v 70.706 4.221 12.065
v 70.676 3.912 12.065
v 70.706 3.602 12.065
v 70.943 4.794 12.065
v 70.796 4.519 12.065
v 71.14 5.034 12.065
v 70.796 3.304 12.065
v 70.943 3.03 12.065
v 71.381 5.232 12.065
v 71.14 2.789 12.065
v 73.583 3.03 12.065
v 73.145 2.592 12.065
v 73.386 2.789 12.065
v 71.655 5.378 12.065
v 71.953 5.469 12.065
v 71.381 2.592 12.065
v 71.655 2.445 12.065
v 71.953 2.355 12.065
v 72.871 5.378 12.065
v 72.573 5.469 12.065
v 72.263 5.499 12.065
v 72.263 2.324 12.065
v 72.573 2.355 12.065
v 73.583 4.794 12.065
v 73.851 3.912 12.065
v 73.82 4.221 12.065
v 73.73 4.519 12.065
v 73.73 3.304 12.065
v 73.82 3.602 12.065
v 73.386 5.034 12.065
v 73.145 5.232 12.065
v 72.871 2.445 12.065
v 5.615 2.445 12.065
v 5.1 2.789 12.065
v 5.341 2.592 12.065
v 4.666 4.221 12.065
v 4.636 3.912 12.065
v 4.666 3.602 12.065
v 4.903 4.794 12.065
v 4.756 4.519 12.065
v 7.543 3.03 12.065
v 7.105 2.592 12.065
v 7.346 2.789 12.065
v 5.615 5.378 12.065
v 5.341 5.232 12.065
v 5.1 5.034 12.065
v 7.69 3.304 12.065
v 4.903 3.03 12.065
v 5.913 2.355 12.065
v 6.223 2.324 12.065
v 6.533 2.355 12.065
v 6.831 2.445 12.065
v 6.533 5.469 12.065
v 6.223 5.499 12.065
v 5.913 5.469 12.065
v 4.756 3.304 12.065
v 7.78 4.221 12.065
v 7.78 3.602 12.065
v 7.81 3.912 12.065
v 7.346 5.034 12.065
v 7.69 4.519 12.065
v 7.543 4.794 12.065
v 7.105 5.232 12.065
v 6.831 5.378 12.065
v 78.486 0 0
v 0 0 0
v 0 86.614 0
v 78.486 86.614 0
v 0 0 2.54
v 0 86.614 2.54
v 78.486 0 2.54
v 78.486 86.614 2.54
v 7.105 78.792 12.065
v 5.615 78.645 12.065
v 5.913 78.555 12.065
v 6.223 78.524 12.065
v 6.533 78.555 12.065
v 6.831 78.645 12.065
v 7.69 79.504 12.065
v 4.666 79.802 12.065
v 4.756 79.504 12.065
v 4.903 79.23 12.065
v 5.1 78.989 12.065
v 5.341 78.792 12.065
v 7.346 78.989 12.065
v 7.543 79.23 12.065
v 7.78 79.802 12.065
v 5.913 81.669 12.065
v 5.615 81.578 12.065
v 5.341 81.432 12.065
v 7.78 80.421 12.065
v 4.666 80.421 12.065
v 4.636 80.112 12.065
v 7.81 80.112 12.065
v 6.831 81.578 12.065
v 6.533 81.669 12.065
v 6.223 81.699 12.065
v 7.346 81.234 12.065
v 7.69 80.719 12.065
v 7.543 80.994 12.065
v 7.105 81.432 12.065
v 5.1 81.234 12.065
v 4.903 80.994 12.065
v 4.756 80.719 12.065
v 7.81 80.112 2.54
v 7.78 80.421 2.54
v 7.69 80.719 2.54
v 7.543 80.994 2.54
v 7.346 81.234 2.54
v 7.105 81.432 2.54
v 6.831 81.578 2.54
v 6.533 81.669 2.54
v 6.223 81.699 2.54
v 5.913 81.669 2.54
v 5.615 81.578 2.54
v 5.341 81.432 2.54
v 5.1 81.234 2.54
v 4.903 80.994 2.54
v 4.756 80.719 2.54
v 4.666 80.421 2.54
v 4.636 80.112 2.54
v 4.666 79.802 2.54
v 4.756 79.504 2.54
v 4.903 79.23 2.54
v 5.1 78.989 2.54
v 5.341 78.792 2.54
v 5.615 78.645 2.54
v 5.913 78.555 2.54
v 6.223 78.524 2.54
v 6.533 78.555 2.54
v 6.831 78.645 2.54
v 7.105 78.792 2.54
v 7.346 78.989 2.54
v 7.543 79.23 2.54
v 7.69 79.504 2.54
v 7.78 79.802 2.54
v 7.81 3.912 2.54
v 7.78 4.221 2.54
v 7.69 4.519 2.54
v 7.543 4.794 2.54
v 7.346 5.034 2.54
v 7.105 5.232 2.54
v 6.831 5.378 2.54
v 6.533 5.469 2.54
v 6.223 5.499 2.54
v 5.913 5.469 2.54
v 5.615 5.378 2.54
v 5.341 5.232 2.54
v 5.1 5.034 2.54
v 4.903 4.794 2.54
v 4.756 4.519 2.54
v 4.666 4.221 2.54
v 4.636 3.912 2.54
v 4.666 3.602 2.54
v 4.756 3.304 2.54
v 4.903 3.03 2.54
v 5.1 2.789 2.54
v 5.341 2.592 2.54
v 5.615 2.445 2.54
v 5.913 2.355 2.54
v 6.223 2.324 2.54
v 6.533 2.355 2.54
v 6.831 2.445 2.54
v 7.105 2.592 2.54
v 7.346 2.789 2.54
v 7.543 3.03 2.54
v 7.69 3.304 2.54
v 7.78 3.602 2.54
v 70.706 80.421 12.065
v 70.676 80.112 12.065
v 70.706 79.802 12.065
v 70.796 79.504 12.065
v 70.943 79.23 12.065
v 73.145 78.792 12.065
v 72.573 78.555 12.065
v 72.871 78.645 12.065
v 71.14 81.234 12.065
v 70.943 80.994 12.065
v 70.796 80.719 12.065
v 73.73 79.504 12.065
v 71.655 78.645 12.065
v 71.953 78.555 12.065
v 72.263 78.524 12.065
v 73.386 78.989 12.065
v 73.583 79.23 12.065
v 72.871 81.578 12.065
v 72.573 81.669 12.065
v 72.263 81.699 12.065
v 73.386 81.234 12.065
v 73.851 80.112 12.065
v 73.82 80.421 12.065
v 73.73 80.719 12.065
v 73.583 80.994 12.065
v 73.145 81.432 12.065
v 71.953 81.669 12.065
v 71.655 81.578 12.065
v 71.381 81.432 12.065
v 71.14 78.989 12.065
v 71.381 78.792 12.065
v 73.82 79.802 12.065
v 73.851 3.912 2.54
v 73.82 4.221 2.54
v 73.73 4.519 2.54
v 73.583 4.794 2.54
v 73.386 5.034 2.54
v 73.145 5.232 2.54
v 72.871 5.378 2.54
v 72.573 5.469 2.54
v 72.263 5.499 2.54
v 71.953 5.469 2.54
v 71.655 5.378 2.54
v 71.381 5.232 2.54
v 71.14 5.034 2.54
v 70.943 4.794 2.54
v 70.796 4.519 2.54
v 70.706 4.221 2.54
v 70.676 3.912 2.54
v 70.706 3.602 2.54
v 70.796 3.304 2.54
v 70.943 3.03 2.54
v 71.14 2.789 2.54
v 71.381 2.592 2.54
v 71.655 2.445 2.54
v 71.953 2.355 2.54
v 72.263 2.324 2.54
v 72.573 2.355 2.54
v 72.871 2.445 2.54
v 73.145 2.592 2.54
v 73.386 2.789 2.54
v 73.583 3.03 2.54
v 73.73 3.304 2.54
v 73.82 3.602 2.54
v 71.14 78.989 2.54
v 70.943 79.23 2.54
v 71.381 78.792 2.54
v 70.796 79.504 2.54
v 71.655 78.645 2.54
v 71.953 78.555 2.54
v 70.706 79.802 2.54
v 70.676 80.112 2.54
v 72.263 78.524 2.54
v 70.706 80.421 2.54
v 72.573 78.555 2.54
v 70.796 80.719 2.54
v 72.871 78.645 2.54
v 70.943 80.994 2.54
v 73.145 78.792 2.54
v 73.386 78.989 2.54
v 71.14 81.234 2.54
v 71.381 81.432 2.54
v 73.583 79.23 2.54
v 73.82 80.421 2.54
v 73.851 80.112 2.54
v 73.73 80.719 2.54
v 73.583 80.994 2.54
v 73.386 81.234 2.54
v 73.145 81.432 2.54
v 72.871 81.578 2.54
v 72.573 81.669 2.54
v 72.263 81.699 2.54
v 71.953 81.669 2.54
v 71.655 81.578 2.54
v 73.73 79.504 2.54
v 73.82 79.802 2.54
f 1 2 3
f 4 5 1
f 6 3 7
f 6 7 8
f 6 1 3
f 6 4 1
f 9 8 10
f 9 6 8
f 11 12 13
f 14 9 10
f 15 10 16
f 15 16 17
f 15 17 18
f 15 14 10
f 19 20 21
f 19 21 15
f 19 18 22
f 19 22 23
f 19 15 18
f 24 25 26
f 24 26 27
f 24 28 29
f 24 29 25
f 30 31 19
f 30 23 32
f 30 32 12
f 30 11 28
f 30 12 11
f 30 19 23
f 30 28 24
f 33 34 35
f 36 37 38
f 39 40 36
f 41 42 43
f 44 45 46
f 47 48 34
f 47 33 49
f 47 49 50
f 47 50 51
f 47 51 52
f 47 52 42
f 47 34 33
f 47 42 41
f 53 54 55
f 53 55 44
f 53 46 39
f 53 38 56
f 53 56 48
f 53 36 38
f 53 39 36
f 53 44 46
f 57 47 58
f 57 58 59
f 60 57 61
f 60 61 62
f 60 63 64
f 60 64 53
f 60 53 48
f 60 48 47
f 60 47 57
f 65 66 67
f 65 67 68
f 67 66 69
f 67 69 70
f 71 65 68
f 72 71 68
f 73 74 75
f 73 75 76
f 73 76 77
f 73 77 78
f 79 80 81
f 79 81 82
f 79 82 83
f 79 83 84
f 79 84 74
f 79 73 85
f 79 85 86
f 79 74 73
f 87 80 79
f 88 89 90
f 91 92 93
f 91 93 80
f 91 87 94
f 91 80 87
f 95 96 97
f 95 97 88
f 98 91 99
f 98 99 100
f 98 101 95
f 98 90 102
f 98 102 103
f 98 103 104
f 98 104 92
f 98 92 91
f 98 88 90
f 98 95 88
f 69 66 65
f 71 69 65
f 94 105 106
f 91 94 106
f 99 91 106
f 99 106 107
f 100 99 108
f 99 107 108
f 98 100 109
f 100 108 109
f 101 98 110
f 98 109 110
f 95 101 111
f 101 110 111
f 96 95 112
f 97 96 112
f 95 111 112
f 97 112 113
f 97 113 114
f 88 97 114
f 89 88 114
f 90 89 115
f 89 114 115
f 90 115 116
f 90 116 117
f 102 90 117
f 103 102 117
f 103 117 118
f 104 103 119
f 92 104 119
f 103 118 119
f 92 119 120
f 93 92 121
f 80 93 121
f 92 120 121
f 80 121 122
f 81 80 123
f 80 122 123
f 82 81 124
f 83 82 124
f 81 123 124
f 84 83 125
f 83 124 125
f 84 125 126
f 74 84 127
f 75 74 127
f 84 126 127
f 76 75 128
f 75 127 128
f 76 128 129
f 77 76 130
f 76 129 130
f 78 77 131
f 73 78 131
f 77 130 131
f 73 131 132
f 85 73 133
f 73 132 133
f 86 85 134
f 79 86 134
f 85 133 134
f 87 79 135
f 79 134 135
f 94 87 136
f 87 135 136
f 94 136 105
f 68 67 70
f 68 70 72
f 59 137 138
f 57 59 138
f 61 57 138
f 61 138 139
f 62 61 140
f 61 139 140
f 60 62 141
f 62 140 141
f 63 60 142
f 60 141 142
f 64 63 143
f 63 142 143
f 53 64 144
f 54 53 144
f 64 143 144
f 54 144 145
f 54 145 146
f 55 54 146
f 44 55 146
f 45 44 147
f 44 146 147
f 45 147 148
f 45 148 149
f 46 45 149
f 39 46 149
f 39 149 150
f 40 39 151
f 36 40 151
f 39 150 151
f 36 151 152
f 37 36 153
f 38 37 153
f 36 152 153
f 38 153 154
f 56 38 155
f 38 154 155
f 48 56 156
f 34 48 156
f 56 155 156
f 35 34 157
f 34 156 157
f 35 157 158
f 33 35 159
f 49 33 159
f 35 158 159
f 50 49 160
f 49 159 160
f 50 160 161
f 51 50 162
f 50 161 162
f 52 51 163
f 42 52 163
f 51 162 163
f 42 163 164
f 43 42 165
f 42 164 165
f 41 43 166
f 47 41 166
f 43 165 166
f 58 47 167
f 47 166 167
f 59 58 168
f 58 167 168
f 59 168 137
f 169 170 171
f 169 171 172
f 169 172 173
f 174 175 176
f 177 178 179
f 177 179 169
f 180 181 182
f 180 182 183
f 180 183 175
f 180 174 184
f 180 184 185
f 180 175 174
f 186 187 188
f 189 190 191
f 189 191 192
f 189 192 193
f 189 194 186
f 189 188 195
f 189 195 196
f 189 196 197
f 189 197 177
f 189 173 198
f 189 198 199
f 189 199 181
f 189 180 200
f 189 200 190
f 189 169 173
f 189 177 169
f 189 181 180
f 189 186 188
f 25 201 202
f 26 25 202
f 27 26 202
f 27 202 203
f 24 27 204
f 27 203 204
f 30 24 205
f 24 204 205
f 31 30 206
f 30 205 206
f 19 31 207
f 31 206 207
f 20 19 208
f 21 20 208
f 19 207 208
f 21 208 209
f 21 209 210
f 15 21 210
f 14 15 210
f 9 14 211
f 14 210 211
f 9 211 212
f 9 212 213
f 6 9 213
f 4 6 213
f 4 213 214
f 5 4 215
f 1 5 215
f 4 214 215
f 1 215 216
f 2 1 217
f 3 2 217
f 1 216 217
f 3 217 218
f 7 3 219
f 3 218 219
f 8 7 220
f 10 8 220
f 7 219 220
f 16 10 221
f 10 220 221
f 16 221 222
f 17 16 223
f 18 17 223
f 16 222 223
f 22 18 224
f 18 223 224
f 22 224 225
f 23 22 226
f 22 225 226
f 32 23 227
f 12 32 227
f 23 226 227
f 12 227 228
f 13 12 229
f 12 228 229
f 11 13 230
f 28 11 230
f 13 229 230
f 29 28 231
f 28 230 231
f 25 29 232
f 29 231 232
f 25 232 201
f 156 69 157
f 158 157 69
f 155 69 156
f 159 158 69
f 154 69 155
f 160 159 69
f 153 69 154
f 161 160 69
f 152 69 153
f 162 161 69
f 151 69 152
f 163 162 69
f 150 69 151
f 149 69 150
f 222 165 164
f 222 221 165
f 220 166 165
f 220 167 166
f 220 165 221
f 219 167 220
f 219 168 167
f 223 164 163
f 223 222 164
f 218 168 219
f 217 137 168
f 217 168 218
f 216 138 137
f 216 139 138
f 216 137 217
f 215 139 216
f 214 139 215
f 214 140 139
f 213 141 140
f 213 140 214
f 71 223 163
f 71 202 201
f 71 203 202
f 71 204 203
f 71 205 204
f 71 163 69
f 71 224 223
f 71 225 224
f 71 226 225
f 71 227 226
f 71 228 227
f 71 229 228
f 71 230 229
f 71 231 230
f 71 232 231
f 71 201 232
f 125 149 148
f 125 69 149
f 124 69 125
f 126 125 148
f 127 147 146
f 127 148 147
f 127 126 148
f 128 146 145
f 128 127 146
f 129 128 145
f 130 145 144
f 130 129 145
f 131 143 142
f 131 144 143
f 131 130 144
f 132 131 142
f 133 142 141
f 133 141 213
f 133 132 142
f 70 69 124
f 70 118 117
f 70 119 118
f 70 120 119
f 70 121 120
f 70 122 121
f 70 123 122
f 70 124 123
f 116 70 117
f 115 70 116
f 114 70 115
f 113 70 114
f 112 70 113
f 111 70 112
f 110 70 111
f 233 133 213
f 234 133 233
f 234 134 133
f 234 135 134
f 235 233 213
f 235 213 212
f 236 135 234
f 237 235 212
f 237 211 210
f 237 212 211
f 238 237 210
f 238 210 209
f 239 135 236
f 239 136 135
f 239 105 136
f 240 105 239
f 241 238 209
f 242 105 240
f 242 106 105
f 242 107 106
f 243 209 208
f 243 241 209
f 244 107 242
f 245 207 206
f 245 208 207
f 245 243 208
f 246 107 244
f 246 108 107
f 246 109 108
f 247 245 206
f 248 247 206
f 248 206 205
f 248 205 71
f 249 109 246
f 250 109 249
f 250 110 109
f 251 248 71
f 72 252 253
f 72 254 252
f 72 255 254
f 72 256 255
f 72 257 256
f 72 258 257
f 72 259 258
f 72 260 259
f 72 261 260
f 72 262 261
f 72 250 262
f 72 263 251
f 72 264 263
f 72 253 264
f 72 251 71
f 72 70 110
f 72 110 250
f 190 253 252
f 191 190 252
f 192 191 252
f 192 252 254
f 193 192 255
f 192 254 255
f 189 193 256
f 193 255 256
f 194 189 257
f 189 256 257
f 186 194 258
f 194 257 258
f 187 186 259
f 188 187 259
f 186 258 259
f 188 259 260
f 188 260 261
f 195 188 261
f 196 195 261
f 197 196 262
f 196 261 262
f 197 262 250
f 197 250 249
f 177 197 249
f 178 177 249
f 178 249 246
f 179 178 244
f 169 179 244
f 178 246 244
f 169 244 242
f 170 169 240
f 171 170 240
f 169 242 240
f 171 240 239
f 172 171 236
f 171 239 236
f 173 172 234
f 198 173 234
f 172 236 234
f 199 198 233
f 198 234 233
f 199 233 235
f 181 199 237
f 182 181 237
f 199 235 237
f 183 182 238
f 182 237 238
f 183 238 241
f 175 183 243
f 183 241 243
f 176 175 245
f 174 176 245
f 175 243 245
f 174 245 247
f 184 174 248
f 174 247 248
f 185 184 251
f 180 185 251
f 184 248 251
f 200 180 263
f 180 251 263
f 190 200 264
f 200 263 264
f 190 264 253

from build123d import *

# Parameters (mm, degrees)
SKETCH1_W           = 78.486
SKETCH1_H           = 86.614
BOSS_EXTRUDE1_DEPTH = 2.54
SKETCH2_R           = 1.5875
BOSS_EXTRUDE2_DEPTH = 9.525


with BuildPart() as part:
    # Sketch1 → Boss-Extrude1 (new body)
    with BuildSketch(Plane.XY):
        with Locations((39.243, 43.307)):
            Rectangle(SKETCH1_W, SKETCH1_H)
    extrude(amount=BOSS_EXTRUDE1_DEPTH)

    # Sketch2 → Boss-Extrude2 (add)
    with BuildSketch(Plane.XY.offset(2.54)):
        with Locations((6.223, 80.1116)):
            Circle(SKETCH2_R)
        with Locations((72.263, 80.1116)):
            Circle(SKETCH2_R)
        with Locations((72.263, 3.9116)):
            Circle(SKETCH2_R)
        with Locations((6.223, 3.9116)):
            Circle(SKETCH2_R)
    extrude(amount=BOSS_EXTRUDE2_DEPTH)


solid = part.part
